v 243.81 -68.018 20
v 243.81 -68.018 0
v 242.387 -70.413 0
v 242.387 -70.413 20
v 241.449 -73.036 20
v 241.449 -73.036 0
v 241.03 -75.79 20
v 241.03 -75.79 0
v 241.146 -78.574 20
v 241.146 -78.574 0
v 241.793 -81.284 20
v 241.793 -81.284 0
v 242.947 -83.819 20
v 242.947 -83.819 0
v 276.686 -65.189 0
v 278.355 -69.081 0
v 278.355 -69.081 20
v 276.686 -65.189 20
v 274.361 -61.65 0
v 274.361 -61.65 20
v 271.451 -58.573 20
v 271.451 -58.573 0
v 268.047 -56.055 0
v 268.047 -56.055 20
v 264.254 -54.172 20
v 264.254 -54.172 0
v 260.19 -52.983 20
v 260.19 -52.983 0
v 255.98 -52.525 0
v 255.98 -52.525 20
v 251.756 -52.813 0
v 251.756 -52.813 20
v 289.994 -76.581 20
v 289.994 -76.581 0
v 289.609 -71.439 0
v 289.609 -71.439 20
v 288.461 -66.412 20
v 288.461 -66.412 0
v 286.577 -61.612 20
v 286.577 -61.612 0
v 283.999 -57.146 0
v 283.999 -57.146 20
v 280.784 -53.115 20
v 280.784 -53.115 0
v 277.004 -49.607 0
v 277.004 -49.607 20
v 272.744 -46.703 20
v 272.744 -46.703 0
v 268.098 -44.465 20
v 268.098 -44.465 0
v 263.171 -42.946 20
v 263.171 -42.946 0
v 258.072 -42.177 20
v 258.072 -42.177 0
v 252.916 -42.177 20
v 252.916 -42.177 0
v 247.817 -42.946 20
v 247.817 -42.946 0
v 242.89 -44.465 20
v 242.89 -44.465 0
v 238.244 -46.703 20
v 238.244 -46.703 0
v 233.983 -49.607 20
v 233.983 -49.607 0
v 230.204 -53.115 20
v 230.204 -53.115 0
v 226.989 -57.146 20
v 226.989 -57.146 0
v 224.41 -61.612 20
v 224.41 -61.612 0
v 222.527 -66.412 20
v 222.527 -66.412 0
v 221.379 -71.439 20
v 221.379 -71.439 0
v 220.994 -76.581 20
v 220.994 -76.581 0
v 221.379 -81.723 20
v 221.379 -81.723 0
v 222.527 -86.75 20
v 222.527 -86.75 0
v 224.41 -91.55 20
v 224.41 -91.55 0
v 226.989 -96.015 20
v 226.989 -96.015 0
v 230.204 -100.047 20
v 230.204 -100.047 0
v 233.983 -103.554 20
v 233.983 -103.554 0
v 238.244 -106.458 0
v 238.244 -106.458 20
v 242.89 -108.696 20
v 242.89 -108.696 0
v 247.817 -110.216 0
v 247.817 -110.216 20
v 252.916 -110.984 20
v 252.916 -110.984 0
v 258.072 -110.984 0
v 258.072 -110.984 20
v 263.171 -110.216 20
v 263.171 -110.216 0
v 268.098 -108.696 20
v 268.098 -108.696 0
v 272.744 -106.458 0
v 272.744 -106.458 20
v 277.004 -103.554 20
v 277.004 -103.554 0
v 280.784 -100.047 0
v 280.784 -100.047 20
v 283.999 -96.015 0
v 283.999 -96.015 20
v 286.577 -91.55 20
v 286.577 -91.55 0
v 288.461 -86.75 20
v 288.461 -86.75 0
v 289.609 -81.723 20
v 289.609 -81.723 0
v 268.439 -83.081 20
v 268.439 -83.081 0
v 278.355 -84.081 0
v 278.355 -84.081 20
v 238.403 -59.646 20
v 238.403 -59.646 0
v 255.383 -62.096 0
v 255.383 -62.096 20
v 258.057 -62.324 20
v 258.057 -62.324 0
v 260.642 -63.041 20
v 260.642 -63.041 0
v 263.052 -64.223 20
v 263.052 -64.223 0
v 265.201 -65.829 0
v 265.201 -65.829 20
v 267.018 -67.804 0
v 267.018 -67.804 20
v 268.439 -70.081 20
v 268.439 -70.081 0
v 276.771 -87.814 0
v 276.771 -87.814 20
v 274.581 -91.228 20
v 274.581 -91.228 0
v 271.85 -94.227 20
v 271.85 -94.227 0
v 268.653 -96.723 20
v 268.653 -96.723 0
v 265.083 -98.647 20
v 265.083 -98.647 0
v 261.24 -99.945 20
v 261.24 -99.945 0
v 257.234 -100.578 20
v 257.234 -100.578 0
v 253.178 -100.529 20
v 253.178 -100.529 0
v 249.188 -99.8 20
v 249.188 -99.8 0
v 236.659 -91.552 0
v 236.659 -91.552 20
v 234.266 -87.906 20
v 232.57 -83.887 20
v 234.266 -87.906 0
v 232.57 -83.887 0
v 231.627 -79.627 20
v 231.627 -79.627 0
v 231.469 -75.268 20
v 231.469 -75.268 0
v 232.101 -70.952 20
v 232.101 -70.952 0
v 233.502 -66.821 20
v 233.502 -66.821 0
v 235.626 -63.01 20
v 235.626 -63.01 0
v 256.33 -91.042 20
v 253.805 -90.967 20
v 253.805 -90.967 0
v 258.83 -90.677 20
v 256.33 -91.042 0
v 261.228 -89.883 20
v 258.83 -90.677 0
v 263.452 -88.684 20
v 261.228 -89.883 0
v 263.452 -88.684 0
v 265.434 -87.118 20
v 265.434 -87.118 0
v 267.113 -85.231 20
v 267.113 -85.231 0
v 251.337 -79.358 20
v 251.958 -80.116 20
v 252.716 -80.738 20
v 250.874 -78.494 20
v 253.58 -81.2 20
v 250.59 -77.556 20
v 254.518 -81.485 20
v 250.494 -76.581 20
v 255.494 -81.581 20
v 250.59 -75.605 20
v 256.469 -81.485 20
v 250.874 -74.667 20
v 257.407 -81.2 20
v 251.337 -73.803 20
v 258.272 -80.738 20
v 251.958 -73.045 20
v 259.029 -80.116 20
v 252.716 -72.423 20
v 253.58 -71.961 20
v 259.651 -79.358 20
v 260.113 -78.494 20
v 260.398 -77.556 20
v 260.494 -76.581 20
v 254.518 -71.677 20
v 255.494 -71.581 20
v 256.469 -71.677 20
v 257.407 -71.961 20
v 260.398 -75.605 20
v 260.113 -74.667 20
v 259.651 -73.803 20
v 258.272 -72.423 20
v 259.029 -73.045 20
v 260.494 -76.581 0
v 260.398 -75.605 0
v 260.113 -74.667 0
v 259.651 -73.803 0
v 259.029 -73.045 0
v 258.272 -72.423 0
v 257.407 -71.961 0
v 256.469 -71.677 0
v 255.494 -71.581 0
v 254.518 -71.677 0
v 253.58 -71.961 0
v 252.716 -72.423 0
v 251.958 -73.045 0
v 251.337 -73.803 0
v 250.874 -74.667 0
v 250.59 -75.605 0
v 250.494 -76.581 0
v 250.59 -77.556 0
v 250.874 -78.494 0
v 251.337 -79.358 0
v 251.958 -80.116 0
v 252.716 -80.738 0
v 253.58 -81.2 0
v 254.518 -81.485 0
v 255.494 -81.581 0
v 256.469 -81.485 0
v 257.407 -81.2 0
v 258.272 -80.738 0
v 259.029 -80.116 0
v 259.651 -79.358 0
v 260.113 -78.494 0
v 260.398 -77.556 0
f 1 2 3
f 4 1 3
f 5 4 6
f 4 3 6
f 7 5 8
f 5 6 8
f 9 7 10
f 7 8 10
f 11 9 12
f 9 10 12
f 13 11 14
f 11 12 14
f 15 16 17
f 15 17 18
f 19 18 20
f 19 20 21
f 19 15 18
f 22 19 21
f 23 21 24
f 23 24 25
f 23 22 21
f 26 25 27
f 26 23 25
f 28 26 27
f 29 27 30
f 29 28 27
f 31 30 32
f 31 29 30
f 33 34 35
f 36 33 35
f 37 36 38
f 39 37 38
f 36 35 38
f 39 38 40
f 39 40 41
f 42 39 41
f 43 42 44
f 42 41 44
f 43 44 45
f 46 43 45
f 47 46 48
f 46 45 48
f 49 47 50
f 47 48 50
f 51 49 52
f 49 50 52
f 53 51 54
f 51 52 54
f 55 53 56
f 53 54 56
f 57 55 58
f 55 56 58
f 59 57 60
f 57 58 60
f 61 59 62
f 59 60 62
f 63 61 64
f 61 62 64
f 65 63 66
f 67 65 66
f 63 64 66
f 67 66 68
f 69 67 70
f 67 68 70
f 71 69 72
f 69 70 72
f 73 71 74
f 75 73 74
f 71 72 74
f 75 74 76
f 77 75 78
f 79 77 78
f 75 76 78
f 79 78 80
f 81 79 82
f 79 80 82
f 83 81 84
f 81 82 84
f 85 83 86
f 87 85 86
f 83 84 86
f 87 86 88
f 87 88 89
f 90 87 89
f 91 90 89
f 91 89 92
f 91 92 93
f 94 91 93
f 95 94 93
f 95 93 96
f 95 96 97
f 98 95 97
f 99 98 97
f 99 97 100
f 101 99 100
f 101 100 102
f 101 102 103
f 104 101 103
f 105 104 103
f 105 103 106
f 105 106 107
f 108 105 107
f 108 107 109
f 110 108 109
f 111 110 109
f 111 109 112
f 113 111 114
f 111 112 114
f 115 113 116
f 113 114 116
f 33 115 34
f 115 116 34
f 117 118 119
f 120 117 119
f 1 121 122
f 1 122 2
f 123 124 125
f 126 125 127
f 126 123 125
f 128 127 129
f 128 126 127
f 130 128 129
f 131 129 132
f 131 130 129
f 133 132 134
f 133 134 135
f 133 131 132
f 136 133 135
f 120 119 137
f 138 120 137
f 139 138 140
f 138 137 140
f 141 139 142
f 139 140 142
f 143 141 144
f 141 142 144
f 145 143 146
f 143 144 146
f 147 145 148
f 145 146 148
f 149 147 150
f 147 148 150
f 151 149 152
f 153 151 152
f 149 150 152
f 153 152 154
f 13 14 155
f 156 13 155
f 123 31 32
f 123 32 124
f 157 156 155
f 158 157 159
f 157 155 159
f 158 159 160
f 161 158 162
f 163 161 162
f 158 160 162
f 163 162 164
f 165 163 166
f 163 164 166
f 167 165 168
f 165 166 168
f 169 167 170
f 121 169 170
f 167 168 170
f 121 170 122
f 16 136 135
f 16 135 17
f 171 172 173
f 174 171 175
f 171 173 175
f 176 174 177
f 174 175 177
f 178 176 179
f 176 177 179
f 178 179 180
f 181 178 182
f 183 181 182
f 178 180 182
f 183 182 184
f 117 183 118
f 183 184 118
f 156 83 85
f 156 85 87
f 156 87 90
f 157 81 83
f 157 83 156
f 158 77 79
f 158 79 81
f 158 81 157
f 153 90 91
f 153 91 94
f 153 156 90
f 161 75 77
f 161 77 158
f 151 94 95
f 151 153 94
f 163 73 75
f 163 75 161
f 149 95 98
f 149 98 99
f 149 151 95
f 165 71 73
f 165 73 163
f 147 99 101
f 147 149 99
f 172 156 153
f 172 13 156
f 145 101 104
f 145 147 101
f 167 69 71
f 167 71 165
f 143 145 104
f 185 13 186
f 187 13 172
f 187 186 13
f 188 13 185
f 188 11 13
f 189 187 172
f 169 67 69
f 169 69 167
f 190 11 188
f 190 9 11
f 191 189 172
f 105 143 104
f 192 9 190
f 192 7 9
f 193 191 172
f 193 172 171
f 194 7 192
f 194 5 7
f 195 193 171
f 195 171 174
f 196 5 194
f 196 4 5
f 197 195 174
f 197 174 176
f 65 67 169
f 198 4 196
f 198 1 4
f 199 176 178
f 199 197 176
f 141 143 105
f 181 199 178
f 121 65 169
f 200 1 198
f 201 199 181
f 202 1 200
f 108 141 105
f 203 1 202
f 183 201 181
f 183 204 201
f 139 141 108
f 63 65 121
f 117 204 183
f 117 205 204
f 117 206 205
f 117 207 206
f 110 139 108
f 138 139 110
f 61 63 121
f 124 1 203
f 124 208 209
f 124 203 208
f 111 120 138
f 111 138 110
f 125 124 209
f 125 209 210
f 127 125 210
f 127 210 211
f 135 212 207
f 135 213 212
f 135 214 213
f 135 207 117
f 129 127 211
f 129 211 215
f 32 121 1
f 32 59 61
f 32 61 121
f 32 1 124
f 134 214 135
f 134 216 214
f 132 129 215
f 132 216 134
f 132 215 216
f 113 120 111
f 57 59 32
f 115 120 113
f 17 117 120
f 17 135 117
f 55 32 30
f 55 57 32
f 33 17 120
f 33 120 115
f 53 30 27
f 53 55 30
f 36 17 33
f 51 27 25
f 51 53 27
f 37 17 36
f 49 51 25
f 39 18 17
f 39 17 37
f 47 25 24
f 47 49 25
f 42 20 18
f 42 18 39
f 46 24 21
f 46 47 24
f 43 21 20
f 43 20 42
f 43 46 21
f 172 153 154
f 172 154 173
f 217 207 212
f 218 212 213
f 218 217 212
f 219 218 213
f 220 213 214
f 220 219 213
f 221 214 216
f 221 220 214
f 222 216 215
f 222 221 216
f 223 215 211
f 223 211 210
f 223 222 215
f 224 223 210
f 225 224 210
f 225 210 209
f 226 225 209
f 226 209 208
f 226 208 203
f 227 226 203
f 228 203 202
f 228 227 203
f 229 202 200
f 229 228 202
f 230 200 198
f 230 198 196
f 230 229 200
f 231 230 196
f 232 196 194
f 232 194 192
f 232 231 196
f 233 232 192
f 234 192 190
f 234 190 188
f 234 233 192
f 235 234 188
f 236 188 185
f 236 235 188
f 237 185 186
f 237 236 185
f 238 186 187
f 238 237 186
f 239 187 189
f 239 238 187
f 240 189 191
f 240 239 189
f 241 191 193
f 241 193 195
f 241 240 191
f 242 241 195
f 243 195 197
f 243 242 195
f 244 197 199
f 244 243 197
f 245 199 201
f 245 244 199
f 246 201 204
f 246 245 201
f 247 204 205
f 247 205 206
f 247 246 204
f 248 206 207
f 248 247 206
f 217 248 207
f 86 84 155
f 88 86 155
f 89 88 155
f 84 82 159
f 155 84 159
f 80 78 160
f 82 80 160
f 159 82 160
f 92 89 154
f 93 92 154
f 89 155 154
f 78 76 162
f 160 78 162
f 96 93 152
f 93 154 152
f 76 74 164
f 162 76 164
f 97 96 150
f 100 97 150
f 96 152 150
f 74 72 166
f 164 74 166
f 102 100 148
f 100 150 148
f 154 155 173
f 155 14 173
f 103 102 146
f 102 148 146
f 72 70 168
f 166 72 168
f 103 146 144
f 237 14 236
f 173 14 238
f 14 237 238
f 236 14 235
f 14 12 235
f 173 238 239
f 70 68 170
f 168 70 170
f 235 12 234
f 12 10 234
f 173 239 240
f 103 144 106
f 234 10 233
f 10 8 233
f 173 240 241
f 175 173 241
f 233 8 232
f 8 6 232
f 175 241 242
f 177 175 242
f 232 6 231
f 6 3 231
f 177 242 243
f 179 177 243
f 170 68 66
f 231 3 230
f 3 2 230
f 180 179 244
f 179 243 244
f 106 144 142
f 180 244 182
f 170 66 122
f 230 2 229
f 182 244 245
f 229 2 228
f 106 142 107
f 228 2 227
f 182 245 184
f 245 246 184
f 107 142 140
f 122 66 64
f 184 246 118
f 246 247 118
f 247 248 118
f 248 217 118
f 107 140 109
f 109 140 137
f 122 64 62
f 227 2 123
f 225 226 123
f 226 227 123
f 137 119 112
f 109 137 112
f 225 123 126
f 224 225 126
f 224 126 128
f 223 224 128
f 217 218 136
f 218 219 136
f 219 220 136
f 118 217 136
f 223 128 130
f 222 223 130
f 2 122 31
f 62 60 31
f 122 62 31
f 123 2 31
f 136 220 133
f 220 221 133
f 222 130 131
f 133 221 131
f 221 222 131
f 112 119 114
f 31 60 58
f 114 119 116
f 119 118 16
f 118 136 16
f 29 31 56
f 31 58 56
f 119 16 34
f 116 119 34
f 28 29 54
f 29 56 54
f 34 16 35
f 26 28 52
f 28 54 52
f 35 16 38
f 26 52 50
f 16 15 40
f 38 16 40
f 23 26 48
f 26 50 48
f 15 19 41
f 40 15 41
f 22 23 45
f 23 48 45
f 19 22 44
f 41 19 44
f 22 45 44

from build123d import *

# Parameters (mm, degrees)
SKETCH1_R          = 34.5
SKETCH1_R_2        = 5
BASE_EXTRUDE_DEPTH = 20


with BuildPart() as part:
    # Sketch1 → Base-Extrude (new body)
    with BuildSketch(Plane.XY):
        with Locations((255.493849666, -76.580612243)):
            Circle(SKETCH1_R)
        with Locations((255.493849666, -76.580612243)):
            Circle(SKETCH1_R_2, mode=Mode.SUBTRACT)
        with BuildLine():
            Line((268.439049892, -83.080585027), (278.355348881, -84.08056418))
            ThreePointArc((278.355348881, -84.08056418), (266.908732596, -97.760741447), (249.188294551, -99.799944708))
            Line((249.188294551, -99.799944708), (253.805371583, -90.9673039))
            ThreePointArc((253.805371583, -90.9673039), (262.366151463, -89.332056204), (268.439049892, -83.080585027))
        make_face(mode=Mode.SUBTRACT)
        with BuildLine():
            Line((242.946837579, -83.819420347), (236.659216854, -91.552386762))
            ThreePointArc((236.659216854, -91.552386762), (231.469396076, -75.2679603), (238.402528058, -59.645909673))
            Line((238.402528058, -59.645909673), (243.810204365, -68.0178856))
            ThreePointArc((243.810204365, -68.0178856), (241.029987303, -75.790333415), (242.946837579, -83.819420347))
        make_face(mode=Mode.SUBTRACT)
        with BuildLine():
            Line((251.755601813, -52.812504863), (255.382868286, -62.095601431))
            ThreePointArc((255.382868286, -62.095601431), (263.051568152, -64.223074204), (268.439022561, -70.080585027))
            Line((268.439022561, -70.080585027), (278.355317346, -69.08056418))
            ThreePointArc((278.355317346, -69.08056418), (268.047208684, -56.054760182), (251.755601813, -52.812504863))
        make_face(mode=Mode.SUBTRACT)
    extrude(amount=BASE_EXTRUDE_DEPTH)


solid = part.part
